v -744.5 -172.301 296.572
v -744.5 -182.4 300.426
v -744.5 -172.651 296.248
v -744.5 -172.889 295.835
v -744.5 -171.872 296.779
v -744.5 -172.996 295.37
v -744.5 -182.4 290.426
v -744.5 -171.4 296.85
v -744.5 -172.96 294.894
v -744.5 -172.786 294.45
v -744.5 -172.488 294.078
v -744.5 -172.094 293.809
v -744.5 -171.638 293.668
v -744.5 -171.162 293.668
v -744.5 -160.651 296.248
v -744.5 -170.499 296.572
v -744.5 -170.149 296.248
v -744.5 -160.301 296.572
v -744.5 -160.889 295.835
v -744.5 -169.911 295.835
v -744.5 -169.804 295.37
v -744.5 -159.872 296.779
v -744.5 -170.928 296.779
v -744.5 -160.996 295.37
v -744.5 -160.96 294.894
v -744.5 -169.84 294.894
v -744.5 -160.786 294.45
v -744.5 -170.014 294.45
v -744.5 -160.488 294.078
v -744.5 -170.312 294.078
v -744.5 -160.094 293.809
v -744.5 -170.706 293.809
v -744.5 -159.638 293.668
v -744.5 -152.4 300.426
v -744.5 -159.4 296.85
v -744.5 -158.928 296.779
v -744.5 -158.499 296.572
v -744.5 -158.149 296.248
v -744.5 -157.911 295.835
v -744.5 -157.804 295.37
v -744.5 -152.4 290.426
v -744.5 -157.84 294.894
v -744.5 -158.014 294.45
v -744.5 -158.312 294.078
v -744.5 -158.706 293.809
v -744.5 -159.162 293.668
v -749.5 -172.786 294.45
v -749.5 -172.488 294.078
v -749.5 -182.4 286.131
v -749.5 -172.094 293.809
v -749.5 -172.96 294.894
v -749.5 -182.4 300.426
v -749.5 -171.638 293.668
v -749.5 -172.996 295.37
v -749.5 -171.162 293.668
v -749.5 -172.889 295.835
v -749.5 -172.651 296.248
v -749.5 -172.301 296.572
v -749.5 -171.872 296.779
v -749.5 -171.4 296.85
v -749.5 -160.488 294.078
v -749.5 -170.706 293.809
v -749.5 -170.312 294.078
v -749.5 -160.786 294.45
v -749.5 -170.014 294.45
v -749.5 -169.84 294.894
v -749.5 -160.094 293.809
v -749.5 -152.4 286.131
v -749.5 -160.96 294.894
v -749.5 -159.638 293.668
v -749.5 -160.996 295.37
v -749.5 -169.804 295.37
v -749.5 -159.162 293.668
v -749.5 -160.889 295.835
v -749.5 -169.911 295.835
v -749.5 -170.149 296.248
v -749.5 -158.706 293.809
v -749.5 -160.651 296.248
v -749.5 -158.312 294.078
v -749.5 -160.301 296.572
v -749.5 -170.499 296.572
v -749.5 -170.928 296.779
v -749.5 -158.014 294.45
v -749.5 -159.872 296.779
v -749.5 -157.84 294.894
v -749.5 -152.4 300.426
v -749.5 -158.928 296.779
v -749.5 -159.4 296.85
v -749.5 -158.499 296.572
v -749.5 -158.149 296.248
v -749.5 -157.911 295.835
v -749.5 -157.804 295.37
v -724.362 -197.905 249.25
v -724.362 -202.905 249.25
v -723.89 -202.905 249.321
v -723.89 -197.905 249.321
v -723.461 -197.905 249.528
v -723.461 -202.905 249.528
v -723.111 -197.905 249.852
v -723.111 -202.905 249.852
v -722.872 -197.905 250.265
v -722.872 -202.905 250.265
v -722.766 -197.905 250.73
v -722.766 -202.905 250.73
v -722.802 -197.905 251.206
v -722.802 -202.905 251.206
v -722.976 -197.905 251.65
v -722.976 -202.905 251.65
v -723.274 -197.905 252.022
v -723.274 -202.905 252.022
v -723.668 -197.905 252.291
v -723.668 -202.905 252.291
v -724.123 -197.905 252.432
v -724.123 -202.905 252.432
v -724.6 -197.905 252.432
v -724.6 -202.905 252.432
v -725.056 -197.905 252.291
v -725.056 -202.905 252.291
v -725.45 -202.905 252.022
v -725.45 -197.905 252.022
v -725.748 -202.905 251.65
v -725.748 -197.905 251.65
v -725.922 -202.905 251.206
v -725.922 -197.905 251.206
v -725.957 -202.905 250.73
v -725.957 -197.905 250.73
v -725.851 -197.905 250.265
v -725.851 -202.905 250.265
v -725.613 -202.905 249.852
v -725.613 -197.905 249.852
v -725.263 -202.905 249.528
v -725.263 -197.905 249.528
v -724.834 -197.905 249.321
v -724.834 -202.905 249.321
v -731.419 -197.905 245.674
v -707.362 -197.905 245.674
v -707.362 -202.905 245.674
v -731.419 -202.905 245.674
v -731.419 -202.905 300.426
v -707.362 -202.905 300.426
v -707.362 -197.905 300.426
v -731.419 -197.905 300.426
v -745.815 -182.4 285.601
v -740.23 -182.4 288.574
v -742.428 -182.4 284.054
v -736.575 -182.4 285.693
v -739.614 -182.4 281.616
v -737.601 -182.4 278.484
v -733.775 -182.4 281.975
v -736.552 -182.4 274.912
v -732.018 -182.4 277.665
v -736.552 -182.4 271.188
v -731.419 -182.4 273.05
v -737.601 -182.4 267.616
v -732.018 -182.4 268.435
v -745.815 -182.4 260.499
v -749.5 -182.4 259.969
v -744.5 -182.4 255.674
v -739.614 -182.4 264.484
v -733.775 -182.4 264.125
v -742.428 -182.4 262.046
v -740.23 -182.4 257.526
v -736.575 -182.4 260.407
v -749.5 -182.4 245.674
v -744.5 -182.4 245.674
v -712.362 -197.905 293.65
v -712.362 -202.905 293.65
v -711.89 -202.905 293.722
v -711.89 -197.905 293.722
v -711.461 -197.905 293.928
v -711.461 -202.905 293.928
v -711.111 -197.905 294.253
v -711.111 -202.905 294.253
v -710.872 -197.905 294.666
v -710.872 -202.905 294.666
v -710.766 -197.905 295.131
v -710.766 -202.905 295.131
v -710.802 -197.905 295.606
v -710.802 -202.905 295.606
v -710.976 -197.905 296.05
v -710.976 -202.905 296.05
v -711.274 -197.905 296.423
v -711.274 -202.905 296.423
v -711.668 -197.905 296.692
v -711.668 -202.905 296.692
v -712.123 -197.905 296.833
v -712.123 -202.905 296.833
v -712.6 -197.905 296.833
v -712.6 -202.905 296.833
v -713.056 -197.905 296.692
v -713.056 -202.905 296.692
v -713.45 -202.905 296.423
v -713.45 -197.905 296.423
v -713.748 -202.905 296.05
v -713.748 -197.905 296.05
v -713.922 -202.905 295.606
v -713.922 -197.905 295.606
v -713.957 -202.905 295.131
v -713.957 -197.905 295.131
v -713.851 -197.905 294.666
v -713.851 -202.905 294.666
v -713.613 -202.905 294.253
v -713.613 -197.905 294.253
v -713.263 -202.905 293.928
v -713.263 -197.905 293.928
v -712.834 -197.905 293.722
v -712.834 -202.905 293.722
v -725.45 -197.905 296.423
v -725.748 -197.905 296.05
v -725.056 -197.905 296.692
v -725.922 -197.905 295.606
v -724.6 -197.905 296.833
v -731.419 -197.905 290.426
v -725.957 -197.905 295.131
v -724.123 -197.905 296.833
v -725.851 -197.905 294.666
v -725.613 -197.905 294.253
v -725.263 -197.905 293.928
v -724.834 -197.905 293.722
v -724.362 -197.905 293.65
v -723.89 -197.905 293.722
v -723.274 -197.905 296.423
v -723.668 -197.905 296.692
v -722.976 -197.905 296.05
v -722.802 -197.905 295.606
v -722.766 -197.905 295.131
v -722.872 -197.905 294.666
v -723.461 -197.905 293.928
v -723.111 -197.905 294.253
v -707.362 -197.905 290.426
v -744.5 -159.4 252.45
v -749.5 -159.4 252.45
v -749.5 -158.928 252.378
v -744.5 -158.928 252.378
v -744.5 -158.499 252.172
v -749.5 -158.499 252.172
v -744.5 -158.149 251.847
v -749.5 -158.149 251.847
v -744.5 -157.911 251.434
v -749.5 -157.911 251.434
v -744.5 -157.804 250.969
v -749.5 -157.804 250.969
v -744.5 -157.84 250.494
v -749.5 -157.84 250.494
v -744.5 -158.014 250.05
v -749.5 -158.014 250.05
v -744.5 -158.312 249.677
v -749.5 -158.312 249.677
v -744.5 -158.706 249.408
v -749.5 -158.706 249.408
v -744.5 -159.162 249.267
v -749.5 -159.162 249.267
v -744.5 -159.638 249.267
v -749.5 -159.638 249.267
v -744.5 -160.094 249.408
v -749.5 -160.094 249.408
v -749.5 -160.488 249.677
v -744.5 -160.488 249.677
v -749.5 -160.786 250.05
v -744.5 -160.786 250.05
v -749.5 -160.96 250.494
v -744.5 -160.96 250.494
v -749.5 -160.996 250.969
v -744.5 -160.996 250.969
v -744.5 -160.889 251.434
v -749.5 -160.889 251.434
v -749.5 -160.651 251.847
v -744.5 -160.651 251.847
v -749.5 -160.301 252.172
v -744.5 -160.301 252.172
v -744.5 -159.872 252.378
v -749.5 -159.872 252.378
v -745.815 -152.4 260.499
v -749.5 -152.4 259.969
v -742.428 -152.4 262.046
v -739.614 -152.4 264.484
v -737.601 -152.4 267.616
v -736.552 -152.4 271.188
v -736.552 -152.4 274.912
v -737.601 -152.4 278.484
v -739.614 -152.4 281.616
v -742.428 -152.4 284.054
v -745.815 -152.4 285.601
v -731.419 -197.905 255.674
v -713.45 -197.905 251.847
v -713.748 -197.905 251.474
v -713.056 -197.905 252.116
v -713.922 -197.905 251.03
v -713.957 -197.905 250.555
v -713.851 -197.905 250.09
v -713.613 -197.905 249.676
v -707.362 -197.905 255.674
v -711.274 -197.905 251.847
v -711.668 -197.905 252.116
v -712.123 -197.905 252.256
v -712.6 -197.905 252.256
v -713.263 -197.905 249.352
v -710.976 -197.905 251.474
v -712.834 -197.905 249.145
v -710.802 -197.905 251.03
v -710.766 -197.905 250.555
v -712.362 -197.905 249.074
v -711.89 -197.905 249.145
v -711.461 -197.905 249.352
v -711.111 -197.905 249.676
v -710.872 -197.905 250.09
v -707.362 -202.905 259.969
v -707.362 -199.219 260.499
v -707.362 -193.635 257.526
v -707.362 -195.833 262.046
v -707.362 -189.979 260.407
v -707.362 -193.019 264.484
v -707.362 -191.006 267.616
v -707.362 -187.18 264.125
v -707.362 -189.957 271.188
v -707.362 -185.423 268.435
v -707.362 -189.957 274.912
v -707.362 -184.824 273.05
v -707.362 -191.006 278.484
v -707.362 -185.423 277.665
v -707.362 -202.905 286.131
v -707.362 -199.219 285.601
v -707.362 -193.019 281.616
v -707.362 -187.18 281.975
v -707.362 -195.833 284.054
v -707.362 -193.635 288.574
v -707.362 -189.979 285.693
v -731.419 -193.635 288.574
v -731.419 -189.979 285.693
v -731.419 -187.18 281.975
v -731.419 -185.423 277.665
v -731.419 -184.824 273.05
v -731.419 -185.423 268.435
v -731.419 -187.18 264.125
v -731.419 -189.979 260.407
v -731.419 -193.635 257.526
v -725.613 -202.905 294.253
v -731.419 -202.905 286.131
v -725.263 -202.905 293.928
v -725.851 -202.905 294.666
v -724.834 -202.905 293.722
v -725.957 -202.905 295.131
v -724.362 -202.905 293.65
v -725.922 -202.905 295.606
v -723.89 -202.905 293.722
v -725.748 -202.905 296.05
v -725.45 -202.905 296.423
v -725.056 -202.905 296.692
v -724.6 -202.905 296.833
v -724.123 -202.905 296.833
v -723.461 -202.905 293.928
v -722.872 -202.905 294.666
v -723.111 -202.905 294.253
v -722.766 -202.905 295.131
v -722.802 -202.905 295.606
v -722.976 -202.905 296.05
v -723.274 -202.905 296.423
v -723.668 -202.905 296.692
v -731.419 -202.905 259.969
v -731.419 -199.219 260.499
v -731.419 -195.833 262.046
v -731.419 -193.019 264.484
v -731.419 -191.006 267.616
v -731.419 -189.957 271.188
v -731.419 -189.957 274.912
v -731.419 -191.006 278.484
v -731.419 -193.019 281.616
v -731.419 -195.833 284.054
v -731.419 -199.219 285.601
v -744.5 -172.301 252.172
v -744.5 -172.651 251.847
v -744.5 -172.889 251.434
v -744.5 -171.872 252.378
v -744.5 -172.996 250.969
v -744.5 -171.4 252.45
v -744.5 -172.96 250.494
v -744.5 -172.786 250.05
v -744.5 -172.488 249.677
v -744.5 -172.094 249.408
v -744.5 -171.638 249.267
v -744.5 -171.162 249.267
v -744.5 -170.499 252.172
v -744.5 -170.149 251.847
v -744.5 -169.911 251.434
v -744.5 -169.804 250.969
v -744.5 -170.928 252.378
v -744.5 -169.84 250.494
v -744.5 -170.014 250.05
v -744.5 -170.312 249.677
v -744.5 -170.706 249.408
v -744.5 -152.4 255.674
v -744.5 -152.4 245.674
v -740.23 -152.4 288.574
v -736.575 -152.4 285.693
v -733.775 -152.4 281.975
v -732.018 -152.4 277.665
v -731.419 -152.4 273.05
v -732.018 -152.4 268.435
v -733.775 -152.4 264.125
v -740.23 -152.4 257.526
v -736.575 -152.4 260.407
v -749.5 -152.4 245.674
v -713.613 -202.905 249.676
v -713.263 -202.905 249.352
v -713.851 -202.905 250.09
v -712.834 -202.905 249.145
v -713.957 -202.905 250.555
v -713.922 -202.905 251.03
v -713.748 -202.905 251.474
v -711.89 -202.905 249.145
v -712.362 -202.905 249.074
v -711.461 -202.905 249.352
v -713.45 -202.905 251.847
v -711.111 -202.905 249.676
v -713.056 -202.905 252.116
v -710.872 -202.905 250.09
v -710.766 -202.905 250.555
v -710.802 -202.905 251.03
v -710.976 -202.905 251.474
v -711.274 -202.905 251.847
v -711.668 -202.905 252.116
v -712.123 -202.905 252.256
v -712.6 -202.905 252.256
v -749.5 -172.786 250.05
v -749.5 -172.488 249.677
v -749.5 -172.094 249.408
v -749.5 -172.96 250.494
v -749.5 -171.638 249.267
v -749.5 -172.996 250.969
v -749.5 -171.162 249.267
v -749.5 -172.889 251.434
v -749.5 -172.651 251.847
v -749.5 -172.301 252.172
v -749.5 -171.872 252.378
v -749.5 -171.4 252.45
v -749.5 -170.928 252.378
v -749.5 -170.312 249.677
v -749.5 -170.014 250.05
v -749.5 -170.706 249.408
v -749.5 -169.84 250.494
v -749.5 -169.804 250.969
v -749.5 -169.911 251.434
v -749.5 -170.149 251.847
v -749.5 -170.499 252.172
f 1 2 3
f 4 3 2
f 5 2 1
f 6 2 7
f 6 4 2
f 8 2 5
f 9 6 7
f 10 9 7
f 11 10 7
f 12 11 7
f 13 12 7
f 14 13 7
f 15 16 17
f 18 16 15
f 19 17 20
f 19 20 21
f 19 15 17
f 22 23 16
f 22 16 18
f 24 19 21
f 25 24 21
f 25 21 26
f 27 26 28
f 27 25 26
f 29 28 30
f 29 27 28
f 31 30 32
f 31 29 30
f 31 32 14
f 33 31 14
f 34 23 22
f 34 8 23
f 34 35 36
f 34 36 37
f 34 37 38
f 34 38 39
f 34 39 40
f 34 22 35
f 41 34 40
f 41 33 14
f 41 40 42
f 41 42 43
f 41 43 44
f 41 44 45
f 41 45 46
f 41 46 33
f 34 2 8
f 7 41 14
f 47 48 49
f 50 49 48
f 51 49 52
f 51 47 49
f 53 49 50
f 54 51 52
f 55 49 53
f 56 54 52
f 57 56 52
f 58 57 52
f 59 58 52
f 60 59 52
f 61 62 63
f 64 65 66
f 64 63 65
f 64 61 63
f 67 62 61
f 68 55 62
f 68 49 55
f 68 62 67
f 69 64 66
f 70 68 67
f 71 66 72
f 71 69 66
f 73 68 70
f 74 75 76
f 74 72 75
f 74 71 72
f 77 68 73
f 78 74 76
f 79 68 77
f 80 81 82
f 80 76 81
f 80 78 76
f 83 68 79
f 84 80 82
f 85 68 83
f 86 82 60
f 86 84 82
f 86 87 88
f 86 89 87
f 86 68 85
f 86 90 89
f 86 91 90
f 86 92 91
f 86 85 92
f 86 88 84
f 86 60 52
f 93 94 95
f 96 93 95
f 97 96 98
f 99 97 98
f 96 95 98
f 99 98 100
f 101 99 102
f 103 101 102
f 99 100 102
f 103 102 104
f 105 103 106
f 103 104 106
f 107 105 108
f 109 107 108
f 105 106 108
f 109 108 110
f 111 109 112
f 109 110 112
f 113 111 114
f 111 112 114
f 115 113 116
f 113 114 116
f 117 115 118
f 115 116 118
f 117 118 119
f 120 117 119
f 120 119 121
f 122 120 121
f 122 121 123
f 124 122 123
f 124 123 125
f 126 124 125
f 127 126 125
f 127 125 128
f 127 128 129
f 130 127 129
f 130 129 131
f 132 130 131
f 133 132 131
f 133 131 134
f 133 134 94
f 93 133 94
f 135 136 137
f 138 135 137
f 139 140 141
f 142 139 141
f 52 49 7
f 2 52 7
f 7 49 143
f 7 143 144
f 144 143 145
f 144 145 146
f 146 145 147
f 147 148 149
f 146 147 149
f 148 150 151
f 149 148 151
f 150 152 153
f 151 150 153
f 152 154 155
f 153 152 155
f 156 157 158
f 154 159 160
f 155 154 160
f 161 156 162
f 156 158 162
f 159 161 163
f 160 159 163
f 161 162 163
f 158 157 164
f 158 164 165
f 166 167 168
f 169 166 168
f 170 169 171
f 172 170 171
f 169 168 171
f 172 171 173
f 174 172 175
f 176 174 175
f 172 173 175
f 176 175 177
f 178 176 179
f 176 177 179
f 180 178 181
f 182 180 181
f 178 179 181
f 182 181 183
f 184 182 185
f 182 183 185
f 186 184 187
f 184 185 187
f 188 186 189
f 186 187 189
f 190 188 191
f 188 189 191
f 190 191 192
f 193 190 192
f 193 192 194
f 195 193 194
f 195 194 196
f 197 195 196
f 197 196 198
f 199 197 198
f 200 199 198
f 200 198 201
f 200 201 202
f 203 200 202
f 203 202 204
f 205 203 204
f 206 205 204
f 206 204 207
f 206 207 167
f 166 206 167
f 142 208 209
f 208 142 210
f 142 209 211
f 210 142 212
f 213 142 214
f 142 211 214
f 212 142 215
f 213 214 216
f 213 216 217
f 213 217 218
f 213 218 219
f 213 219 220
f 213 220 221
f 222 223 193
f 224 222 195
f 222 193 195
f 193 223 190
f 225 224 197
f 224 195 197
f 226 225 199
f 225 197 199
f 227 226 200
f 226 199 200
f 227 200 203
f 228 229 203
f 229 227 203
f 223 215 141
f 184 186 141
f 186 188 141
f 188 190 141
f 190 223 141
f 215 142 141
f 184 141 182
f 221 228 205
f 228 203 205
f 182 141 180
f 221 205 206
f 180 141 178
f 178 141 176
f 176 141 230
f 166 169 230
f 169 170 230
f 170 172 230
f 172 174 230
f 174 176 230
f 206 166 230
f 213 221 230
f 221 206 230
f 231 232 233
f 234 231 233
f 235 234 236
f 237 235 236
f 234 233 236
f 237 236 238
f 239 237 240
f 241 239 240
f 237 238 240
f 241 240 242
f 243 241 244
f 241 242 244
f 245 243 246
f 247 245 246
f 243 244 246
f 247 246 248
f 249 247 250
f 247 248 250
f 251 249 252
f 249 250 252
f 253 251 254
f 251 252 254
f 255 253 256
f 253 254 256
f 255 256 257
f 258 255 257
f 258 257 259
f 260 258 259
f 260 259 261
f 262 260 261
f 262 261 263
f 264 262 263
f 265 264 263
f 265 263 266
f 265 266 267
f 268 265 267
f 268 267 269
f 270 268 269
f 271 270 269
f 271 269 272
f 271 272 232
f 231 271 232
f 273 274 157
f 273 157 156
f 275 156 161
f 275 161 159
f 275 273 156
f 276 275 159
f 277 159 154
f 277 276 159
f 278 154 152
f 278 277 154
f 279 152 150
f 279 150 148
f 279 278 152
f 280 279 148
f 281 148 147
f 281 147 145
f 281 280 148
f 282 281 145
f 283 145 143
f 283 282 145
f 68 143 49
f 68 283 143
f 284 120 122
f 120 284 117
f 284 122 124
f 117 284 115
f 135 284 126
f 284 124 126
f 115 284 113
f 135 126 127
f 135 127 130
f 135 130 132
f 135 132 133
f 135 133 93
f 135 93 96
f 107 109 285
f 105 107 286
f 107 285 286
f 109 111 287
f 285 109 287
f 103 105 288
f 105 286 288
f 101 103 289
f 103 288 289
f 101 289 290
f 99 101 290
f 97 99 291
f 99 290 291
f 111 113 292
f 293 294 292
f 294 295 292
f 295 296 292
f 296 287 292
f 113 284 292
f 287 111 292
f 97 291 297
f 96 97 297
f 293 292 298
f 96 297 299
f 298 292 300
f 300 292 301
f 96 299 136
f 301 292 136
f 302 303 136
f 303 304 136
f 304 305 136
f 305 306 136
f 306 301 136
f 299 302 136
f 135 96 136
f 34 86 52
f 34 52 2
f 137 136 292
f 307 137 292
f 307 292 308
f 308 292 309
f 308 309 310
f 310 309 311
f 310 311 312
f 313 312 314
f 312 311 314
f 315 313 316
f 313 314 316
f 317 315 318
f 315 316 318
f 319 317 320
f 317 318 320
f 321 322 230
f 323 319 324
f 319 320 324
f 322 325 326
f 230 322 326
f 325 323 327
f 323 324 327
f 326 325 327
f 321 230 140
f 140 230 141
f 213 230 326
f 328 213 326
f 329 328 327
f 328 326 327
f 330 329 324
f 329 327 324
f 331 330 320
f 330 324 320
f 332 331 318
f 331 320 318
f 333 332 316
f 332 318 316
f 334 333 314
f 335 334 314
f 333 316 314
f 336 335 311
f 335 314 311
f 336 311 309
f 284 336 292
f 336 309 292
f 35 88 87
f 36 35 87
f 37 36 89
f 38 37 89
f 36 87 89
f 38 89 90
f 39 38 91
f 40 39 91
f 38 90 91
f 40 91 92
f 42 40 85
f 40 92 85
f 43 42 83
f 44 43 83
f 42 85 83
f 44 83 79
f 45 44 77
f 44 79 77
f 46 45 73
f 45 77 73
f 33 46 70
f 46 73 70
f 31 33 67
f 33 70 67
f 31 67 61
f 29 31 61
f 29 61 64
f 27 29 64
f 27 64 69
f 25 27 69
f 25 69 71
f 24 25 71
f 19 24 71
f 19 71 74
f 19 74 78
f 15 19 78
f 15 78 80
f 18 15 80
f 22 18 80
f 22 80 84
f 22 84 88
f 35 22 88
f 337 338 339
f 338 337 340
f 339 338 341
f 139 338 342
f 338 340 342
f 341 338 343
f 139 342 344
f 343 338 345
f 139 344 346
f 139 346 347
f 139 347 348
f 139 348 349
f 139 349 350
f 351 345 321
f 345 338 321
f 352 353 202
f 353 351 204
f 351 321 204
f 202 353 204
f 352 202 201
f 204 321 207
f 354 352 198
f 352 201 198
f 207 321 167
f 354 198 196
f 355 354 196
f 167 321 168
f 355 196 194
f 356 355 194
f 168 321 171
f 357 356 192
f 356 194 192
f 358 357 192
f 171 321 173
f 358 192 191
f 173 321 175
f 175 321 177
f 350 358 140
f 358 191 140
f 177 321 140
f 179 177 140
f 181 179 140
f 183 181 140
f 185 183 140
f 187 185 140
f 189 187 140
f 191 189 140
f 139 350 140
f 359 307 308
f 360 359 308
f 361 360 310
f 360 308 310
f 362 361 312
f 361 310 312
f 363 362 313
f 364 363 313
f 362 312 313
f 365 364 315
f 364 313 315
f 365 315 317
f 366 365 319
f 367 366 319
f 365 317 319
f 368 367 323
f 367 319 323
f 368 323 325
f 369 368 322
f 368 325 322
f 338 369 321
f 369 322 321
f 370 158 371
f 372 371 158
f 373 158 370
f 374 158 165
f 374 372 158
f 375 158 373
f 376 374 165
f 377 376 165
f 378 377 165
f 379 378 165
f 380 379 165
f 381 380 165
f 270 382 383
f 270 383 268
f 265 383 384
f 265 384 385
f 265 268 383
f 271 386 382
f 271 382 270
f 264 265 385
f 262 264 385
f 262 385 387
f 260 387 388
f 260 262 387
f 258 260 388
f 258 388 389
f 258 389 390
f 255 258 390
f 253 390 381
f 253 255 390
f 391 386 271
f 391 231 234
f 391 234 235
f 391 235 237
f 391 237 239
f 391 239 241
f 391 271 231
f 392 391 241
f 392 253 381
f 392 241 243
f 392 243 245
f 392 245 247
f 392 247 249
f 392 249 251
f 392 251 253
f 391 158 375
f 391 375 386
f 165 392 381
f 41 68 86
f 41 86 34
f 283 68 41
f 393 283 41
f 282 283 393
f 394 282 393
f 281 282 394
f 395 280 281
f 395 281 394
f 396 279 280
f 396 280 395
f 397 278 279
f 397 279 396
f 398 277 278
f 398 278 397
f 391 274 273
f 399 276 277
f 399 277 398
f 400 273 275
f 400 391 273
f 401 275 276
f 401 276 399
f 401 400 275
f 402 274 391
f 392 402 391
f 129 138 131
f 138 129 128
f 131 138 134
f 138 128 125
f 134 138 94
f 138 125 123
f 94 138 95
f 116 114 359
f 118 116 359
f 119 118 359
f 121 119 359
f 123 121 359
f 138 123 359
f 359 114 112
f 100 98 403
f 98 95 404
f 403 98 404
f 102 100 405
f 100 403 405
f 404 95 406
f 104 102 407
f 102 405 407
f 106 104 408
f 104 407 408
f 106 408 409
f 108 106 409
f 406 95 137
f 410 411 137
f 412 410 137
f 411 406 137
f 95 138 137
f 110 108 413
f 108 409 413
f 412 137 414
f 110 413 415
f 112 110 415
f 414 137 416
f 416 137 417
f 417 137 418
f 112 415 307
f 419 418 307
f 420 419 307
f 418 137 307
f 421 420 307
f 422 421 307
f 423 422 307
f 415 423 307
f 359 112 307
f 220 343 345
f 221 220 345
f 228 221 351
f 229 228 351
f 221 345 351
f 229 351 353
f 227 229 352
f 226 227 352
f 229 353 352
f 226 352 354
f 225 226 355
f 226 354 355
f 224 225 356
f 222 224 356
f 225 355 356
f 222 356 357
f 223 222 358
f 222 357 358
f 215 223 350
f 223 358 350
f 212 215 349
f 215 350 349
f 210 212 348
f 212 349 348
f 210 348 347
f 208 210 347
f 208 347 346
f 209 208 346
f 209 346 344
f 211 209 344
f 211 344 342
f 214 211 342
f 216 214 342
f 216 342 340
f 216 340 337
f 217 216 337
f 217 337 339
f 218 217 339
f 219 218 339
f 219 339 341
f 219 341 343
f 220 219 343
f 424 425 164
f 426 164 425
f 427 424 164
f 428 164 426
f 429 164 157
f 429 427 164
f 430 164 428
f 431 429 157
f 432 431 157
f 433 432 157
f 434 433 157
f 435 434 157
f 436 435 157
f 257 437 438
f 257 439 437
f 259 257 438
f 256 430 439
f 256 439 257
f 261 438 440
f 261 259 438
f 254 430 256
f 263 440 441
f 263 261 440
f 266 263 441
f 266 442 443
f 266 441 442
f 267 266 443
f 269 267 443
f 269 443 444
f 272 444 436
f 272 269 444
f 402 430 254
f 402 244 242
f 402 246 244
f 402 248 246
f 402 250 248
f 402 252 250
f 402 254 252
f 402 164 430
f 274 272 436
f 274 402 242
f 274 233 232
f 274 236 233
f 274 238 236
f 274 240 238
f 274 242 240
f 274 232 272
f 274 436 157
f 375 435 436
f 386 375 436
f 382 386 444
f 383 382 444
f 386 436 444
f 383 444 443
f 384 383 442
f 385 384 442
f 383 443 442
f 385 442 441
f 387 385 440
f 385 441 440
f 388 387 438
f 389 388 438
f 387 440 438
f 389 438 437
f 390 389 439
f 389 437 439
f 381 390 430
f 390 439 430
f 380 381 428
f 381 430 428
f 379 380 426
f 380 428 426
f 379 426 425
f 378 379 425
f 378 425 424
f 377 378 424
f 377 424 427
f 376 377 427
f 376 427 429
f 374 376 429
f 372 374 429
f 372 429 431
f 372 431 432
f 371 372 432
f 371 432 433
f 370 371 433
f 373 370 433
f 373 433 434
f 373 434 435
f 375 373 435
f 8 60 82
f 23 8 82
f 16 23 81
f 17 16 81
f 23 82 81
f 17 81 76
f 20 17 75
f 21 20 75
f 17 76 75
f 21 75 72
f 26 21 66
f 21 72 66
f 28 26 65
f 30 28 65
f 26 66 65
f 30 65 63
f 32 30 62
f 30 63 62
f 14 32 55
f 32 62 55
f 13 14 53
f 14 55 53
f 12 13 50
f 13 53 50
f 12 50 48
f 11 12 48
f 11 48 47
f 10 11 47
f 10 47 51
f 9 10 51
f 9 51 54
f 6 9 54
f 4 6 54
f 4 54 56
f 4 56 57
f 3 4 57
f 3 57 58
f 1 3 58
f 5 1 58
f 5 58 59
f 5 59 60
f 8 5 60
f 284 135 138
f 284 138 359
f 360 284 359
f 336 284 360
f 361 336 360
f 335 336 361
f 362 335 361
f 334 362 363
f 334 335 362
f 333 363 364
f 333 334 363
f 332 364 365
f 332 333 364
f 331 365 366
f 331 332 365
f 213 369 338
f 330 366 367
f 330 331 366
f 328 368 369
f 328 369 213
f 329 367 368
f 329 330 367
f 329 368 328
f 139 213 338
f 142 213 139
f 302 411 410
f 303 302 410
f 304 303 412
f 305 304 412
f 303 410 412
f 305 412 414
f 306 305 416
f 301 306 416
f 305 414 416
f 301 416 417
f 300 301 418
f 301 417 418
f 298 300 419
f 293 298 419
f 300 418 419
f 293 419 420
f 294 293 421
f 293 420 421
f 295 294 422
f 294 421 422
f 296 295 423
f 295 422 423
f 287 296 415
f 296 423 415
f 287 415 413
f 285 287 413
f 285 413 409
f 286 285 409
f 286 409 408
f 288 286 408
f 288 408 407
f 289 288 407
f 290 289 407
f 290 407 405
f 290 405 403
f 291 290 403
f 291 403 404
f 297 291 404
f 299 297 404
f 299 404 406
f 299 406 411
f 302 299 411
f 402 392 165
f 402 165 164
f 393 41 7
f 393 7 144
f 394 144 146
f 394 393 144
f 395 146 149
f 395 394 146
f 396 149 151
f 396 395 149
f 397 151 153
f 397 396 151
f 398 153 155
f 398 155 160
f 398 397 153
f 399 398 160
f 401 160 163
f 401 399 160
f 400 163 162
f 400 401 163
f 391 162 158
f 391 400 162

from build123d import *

# Parameters (mm, degrees)
BOSS_EXTRUDE2_DEPTH = 30
BOSS_EXTRUDE3_DEPTH = 24.057106
SKETCH8_R           = 1.6
CUT_EXTRUDE3_DEPTH  = 365.96801264
SKETCH10_R          = 1.6
CUT_EXTRUDE4_DEPTH  = 810.046786406


with BuildPart() as part:
    # Sketch5 → Boss-Extrude2 (new body)
    with BuildSketch(Plane(origin=(0, -152.4, 0), x_dir=(1, 0, 0), z_dir=(0, 1, 0))):
        with BuildLine():
            Line((-749.5, -256.025020287), (-749.5, -259.969))
            ThreePointArc((-749.5, -259.969), (-736.419, -273.05), (-749.5, -286.131))
            Line((-749.5, -286.131), (-749.5, -290.074979713))
            Line((-749.5, -290.074979713), (-749.5, -300.425918997))
            Line((-749.5, -300.425918997), (-744.5, -300.425918997))
            Line((-744.5, -300.425918997), (-744.5, -290.425918997))
            ThreePointArc((-744.5, -290.425918997), (-731.419, -273.05), (-744.5, -255.674081003))
            Line((-744.5, -255.674081003), (-744.5, -245.674081003))
            Line((-744.5, -245.674081003), (-749.5, -245.674081003))
            Line((-749.5, -245.674081003), (-749.5, -256.025020287))
        make_face()
    extrude(amount=-BOSS_EXTRUDE2_DEPTH)

    # Sketch8 → Cut-Extrude3 (cut, through all)
    with BuildSketch(Plane.ZY.offset(749.5)):
        with Locations((295.250449355, -159.4)):
            Circle(SKETCH8_R)
        with Locations((295.250449355, -171.4)):
            Circle(SKETCH8_R)
        with Locations((250.849550645, -171.4)):
            Circle(SKETCH8_R)
        with Locations((250.849550645, -159.4)):
            Circle(SKETCH8_R)
    extrude(amount=-CUT_EXTRUDE3_DEPTH, mode=Mode.SUBTRACT)


with BuildPart() as body_2:
    # Sketch6 → Boss-Extrude3 (new body)
    with BuildSketch(Plane(origin=(-707.361893949, 0, 0), x_dir=(0, 0, -1), z_dir=(1, 0, 0))):
        with BuildLine():
            Line((-291.131, -202.904651163), (-300.425918997, -202.904651163))
            Line((-300.425918997, -202.904651163), (-300.425918997, -197.904651163))
            Line((-300.425918997, -197.904651163), (-290.425918997, -197.904651163))
            ThreePointArc((-290.425918997, -197.904651163), (-273.05, -184.823651163), (-255.674081003, -197.904651163))
            Line((-255.674081003, -197.904651163), (-245.674081003, -197.904651163))
            Line((-245.674081003, -197.904651163), (-245.674081003, -202.904651163))
            Line((-245.674081003, -202.904651163), (-254.969, -202.904651163))
            Line((-254.969, -202.904651163), (-259.969, -202.904651163))
            ThreePointArc((-259.969, -202.904651163), (-273.05, -189.823651163), (-286.131, -202.904651163))
            Line((-286.131, -202.904651163), (-291.131, -202.904651163))
        make_face()
    extrude(amount=-BOSS_EXTRUDE3_DEPTH)

    # Sketch10 → Cut-Extrude4 (cut, through all)
    with BuildSketch(Plane.XZ.offset(202.904651163)):
        with Locations(Location((-724.361893949, 295.250449355, 0), (0, 0, 270))):
            Circle(SKETCH10_R)
        with Locations(Location((-712.361893949, 295.250449355, 0), (0, 0, 270))):
            Circle(SKETCH10_R)
        with Locations(Location((-712.361893949, 250.674081003, 0), (0, 0, 270))):
            Circle(SKETCH10_R)
        with Locations(Location((-724.361893949, 250.849550645, 0), (0, 0, 270))):
            Circle(SKETCH10_R)
    extrude(amount=-CUT_EXTRUDE4_DEPTH, mode=Mode.SUBTRACT)


solid = Compound([part.part, body_2.part])
